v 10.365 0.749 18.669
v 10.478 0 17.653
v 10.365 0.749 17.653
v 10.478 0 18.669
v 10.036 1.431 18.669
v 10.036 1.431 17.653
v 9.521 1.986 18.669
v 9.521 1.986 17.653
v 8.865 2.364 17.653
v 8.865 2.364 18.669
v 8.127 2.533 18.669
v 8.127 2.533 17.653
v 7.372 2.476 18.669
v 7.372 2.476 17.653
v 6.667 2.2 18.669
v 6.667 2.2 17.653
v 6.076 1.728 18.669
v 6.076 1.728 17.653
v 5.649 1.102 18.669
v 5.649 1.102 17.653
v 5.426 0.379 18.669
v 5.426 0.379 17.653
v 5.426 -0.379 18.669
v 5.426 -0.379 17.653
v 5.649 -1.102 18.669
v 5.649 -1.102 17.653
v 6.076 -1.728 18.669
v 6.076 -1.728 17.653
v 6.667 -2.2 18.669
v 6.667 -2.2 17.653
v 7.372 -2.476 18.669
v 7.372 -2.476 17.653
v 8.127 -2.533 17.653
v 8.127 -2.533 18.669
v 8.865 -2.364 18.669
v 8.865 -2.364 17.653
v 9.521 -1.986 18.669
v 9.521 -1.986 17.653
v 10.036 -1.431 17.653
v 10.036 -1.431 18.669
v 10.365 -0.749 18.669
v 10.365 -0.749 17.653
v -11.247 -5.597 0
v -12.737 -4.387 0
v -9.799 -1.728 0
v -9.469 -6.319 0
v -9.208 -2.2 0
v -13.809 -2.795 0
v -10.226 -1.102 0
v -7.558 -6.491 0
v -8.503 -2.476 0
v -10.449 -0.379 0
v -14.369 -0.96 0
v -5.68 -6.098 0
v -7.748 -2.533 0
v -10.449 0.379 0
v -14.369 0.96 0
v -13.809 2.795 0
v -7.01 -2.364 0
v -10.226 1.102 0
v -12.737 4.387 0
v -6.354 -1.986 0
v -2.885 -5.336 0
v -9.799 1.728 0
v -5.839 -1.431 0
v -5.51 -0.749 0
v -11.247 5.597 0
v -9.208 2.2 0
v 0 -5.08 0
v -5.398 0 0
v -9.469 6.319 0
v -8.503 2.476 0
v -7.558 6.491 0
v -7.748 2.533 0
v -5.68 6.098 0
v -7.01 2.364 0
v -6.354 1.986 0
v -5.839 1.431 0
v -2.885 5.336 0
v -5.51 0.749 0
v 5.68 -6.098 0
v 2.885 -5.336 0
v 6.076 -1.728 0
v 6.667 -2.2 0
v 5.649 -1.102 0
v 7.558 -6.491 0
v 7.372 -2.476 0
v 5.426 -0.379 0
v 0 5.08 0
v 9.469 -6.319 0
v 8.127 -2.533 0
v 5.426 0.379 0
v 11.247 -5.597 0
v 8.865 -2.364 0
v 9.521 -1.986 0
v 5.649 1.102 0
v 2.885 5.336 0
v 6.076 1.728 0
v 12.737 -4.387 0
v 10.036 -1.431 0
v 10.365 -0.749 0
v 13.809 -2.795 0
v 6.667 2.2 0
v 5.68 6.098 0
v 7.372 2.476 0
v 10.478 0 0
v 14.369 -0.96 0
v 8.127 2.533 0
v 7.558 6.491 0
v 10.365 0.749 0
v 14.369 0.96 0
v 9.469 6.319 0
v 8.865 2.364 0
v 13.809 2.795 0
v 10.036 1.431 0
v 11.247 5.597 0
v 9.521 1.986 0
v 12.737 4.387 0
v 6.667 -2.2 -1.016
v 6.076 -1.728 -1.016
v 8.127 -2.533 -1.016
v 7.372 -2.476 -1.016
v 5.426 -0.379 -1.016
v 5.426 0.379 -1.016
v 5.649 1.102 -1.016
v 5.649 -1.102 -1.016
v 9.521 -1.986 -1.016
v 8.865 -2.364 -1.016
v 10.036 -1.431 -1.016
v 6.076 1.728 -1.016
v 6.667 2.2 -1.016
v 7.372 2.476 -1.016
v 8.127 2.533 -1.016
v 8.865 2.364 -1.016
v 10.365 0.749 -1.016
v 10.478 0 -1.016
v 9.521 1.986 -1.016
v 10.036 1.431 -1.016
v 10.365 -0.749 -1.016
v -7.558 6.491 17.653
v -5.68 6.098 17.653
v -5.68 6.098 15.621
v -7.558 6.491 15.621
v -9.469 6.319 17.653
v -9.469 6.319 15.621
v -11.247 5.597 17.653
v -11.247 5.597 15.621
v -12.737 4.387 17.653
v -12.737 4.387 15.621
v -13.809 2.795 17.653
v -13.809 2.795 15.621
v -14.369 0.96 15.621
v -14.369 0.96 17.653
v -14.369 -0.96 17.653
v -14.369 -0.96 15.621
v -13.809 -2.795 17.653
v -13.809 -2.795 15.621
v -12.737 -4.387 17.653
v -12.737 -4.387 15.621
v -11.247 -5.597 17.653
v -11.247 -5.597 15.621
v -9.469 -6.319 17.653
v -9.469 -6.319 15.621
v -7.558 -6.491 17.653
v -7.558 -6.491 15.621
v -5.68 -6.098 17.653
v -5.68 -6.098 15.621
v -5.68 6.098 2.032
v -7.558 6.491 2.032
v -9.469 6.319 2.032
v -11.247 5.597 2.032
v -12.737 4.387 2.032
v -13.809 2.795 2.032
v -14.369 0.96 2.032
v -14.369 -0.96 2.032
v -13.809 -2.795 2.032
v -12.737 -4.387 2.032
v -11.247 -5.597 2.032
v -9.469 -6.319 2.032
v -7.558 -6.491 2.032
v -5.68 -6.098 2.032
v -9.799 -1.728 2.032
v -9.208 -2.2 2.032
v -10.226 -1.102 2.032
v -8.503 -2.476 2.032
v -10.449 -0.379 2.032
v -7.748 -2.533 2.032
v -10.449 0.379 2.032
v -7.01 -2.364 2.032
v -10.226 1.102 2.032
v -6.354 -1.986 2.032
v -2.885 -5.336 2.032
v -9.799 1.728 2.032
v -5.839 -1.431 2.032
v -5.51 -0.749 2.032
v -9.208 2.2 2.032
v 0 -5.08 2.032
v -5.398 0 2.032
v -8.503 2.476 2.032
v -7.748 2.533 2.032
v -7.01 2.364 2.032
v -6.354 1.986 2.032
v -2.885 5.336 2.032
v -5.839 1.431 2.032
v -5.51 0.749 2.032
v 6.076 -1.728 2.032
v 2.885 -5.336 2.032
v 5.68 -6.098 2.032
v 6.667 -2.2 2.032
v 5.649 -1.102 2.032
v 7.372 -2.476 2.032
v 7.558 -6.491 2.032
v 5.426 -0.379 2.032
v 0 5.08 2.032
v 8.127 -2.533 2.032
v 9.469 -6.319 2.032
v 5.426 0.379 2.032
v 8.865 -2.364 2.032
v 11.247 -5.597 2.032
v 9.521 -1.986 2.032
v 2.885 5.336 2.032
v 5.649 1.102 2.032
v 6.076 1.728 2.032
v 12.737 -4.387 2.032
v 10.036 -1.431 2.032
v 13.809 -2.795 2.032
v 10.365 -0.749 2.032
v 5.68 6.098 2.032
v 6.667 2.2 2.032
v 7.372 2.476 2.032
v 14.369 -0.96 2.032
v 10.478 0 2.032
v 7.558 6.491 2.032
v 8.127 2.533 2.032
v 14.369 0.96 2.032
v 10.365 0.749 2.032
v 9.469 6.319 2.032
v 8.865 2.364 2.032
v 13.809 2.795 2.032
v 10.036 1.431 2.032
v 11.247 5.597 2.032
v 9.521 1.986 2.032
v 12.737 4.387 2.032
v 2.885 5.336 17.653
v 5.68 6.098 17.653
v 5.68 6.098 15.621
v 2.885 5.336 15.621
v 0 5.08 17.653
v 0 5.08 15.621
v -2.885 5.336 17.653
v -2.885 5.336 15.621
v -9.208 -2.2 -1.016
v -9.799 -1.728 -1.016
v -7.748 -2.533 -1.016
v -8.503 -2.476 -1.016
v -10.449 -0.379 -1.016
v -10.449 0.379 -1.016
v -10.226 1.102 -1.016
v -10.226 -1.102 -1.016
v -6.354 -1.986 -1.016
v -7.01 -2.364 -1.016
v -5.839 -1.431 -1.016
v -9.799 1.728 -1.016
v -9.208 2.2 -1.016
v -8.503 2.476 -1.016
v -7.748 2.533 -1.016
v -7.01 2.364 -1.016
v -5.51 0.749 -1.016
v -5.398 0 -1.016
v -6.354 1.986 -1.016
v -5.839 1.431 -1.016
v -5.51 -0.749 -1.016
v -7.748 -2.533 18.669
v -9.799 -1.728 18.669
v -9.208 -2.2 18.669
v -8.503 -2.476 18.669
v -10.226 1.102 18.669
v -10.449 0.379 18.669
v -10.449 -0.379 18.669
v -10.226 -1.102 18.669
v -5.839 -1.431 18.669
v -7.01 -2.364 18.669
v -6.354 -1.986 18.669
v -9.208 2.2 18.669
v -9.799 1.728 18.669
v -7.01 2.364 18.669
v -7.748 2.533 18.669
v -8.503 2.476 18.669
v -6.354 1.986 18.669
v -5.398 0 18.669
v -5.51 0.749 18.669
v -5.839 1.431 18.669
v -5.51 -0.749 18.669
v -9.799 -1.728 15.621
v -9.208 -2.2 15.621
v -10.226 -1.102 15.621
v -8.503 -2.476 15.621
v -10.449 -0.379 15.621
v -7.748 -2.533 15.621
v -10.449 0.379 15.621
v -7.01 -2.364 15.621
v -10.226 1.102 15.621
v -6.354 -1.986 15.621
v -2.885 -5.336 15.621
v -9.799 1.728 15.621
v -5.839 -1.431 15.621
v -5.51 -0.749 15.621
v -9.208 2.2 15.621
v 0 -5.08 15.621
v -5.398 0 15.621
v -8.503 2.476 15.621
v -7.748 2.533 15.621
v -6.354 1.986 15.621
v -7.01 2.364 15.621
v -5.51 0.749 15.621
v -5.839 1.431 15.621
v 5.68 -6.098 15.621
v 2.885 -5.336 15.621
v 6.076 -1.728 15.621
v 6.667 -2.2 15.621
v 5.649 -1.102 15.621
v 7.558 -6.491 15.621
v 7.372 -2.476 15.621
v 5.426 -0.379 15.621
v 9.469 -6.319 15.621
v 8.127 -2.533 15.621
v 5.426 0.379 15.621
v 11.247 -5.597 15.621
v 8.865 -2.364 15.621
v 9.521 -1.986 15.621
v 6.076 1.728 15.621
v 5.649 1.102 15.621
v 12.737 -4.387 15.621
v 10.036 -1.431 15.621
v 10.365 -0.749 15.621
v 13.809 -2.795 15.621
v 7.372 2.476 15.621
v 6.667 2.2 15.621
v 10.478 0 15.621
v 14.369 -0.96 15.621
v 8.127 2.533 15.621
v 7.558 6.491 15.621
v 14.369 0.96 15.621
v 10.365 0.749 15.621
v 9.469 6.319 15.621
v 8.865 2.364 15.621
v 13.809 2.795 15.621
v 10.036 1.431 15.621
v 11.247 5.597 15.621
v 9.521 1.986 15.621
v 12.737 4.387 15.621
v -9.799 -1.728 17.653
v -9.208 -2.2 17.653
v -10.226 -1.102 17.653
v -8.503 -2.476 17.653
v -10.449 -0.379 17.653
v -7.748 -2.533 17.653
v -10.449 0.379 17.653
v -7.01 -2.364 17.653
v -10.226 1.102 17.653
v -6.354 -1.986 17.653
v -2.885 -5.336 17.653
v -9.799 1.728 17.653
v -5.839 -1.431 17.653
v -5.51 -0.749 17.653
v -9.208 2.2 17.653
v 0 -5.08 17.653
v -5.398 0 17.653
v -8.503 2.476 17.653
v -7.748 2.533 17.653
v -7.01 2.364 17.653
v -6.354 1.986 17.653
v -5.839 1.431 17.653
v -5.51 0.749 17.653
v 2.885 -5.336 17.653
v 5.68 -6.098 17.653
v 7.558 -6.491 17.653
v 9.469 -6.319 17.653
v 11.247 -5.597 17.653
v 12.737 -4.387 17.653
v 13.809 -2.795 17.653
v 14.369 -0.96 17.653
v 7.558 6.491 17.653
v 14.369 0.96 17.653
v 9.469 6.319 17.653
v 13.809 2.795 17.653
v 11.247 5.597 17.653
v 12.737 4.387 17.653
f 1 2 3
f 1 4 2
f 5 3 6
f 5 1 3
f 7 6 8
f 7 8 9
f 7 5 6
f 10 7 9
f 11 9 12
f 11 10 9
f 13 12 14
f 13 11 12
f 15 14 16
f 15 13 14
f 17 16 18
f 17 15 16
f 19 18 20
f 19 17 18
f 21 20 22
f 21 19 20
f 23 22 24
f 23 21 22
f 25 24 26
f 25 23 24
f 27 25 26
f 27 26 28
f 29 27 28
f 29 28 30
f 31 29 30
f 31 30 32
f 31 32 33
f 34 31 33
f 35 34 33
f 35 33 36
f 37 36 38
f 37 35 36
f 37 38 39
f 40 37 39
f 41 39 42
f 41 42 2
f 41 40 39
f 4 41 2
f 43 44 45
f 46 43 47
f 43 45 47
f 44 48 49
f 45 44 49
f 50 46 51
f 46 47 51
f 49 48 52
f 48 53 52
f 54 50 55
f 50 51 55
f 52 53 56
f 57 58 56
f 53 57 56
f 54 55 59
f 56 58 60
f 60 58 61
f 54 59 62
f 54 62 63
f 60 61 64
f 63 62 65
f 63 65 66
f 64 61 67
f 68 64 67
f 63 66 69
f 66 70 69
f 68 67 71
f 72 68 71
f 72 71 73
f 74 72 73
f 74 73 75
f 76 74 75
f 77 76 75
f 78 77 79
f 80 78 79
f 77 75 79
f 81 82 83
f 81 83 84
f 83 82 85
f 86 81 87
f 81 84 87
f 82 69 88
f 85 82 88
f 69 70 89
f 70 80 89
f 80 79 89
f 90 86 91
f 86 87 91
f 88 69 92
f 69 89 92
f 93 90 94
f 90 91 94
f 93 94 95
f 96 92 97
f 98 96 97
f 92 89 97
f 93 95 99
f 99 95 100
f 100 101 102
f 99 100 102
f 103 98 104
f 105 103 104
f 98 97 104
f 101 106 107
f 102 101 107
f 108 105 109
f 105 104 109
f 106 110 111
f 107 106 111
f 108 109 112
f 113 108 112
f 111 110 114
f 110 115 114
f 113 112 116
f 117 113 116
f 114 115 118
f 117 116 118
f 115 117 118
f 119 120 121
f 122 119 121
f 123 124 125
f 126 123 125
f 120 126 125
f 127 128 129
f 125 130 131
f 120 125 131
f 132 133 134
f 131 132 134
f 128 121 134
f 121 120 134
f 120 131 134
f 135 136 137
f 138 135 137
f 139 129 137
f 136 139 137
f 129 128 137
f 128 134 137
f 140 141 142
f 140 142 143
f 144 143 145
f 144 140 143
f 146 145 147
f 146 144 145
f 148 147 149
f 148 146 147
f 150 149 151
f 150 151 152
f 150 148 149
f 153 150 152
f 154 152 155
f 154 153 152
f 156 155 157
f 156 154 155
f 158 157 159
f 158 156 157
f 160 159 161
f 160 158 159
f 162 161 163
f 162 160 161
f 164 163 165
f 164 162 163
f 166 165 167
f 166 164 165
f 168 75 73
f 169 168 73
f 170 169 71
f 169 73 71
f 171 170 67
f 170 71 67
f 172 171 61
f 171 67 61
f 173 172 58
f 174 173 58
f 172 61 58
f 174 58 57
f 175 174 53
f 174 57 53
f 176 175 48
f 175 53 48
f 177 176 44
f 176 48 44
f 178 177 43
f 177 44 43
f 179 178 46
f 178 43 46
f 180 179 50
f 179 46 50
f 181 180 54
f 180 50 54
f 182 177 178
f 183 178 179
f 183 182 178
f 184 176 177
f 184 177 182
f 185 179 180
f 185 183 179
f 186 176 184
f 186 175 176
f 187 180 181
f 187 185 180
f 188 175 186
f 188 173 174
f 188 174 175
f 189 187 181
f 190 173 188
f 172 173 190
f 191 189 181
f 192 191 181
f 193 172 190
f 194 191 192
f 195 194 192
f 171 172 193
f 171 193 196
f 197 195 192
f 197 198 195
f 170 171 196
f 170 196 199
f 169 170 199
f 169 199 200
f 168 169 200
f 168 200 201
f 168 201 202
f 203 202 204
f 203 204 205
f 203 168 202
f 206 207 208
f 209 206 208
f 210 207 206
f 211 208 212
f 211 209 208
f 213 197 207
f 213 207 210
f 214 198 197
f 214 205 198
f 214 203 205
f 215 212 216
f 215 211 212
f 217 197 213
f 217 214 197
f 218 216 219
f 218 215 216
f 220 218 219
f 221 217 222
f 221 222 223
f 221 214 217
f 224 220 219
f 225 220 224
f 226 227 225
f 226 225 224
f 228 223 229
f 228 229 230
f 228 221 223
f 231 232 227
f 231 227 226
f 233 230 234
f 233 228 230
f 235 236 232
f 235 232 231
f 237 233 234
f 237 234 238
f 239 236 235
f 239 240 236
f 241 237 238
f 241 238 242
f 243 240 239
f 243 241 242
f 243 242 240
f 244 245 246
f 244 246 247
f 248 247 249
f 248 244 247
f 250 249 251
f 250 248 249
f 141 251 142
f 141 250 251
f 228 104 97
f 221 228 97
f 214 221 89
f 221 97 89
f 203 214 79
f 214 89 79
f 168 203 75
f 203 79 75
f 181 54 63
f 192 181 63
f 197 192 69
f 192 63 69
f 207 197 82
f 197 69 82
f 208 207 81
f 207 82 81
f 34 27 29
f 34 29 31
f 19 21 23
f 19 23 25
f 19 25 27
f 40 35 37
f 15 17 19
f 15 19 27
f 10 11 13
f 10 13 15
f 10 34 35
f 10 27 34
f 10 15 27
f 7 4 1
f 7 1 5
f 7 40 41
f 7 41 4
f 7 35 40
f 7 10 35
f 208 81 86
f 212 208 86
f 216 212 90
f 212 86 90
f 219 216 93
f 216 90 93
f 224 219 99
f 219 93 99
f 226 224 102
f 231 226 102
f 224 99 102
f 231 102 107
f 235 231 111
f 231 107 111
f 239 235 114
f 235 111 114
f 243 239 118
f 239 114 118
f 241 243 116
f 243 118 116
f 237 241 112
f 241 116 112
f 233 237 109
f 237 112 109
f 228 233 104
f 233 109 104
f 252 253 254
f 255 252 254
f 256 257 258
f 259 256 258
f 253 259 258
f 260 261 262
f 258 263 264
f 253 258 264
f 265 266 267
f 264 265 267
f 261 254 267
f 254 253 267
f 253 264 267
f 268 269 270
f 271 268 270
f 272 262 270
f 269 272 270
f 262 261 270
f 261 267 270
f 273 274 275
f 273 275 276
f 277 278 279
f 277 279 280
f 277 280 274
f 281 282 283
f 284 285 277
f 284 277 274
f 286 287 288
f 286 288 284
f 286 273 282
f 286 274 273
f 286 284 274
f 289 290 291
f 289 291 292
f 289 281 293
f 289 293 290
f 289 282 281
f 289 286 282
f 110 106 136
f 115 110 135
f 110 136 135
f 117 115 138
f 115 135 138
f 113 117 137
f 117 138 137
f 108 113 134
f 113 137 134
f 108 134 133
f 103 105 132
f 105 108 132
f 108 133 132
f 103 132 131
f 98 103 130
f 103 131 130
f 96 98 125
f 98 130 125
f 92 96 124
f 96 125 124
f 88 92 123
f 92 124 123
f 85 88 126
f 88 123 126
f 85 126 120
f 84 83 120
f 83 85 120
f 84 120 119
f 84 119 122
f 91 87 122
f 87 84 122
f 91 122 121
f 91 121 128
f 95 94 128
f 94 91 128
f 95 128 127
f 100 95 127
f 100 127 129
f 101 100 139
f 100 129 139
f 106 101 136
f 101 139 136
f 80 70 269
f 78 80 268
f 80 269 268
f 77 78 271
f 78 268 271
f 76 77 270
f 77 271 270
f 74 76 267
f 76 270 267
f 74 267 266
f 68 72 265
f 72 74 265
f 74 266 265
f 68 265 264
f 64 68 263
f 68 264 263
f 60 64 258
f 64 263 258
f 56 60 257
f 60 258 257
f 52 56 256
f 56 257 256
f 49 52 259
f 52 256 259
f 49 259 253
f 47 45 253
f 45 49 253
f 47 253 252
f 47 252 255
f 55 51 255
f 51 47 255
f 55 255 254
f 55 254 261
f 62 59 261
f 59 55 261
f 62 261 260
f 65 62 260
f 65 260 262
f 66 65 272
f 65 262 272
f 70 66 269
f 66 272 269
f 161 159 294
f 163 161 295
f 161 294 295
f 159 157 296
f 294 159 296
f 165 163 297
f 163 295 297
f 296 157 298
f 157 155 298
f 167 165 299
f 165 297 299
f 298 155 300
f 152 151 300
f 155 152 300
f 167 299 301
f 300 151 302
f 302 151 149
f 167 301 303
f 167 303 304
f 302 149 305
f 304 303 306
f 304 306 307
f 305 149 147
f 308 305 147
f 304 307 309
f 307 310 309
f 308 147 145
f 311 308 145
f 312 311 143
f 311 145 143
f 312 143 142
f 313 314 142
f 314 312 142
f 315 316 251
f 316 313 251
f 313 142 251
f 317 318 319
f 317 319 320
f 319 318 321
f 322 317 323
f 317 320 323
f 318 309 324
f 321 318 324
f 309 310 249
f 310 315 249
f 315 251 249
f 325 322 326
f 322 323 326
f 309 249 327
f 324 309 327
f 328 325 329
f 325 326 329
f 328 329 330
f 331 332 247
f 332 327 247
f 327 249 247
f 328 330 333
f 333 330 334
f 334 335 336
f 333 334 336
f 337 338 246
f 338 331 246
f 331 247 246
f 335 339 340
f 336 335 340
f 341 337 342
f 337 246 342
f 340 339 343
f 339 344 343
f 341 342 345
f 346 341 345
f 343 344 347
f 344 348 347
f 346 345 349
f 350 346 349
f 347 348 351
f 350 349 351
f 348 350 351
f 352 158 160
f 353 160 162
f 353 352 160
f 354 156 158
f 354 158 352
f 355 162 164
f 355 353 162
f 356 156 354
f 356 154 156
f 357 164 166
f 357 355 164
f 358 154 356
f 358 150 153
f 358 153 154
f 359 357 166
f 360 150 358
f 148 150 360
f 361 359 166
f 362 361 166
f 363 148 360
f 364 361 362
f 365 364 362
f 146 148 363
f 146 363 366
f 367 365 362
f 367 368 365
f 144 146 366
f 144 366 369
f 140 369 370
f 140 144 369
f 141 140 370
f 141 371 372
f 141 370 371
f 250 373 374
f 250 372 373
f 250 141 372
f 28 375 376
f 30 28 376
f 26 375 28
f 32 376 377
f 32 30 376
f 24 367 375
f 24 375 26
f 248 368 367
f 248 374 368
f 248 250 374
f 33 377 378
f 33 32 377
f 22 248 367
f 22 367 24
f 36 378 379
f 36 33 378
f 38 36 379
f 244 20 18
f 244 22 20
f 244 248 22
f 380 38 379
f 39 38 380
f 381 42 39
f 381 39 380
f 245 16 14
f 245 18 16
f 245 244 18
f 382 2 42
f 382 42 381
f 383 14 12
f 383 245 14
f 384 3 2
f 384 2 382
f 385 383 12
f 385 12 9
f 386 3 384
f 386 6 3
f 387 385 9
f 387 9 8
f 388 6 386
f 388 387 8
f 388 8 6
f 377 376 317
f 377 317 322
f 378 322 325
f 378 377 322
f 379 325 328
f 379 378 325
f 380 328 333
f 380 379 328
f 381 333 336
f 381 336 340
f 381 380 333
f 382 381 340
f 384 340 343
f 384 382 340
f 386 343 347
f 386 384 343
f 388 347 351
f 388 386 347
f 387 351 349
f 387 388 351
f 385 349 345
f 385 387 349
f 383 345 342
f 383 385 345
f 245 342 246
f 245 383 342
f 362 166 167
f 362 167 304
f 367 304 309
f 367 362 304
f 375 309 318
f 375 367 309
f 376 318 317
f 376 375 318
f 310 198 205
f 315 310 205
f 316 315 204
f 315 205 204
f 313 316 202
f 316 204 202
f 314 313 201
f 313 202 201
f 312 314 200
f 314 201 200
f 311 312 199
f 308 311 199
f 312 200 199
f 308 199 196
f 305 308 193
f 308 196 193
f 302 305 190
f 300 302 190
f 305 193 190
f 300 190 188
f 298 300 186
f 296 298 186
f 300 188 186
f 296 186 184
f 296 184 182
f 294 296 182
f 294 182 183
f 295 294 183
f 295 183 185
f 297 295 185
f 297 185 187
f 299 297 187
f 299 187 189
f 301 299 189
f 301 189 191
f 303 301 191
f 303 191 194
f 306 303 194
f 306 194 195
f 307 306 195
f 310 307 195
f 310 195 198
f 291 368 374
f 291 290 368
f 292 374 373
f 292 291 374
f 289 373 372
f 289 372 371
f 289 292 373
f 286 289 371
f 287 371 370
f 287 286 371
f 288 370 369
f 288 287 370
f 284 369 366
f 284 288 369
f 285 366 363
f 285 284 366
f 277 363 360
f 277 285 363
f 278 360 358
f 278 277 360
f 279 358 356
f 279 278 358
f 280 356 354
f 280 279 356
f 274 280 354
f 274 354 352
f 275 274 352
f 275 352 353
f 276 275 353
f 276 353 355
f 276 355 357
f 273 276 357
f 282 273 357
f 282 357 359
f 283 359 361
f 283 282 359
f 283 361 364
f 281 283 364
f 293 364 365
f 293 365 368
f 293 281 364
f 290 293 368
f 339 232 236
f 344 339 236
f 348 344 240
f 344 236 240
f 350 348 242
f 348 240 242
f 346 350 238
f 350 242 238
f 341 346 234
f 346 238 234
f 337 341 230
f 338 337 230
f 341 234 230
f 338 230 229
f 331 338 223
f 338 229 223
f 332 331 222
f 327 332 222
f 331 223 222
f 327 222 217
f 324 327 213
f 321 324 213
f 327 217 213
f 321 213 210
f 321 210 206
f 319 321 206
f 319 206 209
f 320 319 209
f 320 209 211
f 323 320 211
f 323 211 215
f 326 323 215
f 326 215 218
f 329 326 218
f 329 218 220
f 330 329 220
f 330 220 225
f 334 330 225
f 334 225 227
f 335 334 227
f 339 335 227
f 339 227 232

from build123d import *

# Parameters (mm, degrees)
BOSS_EXTRUDE1_DEPTH = 2.032
BOSS_EXTRUDE2_START = -3.048
SKETCH2_R           = 2.54
BOSS_EXTRUDE2_DEPTH = 16.637


# Read off the part's stored shape, not the designer's step: Boss-Extrude1
with BuildPart() as part:
    # Boss-Extrude1 outline → Boss-Extrude1 (new body)
    with BuildSketch(Plane.XY):
        with BuildLine():
            ThreePointArc((5.67954862, -6.097775113), (14.4399, 0), (5.67954862, 6.097775113))
            ThreePointArc((5.67954862, 6.097775113), (0, 5.08), (-5.67954862, 6.097775113))
            ThreePointArc((-5.67954862, 6.097775113), (-14.4399, 0), (-5.67954862, -6.097775113))
            ThreePointArc((-5.67954862, -6.097775113), (0, -5.08), (5.67954862, -6.097775113))
        make_face()
    boss_extrude1 = extrude(amount=BOSS_EXTRUDE1_DEPTH)

    # Sketch2 → Boss-Extrude2 (add)
    with BuildSketch(Plane.XY.offset(2.032).offset(BOSS_EXTRUDE2_START)):
        with Locations((-7.9375, 0)):
            Circle(SKETCH2_R)
        with Locations((7.9375, 0)):
            Circle(SKETCH2_R)
    boss_extrude2 = extrude(amount=BOSS_EXTRUDE2_DEPTH)

    # Mirror1: Boss-Extrude1, Boss-Extrude2 across plane
    add(boss_extrude1.mirror(Plane.XY.offset(8.8265)))
    add(boss_extrude2.mirror(Plane.XY.offset(8.8265)))


solid = part.part
